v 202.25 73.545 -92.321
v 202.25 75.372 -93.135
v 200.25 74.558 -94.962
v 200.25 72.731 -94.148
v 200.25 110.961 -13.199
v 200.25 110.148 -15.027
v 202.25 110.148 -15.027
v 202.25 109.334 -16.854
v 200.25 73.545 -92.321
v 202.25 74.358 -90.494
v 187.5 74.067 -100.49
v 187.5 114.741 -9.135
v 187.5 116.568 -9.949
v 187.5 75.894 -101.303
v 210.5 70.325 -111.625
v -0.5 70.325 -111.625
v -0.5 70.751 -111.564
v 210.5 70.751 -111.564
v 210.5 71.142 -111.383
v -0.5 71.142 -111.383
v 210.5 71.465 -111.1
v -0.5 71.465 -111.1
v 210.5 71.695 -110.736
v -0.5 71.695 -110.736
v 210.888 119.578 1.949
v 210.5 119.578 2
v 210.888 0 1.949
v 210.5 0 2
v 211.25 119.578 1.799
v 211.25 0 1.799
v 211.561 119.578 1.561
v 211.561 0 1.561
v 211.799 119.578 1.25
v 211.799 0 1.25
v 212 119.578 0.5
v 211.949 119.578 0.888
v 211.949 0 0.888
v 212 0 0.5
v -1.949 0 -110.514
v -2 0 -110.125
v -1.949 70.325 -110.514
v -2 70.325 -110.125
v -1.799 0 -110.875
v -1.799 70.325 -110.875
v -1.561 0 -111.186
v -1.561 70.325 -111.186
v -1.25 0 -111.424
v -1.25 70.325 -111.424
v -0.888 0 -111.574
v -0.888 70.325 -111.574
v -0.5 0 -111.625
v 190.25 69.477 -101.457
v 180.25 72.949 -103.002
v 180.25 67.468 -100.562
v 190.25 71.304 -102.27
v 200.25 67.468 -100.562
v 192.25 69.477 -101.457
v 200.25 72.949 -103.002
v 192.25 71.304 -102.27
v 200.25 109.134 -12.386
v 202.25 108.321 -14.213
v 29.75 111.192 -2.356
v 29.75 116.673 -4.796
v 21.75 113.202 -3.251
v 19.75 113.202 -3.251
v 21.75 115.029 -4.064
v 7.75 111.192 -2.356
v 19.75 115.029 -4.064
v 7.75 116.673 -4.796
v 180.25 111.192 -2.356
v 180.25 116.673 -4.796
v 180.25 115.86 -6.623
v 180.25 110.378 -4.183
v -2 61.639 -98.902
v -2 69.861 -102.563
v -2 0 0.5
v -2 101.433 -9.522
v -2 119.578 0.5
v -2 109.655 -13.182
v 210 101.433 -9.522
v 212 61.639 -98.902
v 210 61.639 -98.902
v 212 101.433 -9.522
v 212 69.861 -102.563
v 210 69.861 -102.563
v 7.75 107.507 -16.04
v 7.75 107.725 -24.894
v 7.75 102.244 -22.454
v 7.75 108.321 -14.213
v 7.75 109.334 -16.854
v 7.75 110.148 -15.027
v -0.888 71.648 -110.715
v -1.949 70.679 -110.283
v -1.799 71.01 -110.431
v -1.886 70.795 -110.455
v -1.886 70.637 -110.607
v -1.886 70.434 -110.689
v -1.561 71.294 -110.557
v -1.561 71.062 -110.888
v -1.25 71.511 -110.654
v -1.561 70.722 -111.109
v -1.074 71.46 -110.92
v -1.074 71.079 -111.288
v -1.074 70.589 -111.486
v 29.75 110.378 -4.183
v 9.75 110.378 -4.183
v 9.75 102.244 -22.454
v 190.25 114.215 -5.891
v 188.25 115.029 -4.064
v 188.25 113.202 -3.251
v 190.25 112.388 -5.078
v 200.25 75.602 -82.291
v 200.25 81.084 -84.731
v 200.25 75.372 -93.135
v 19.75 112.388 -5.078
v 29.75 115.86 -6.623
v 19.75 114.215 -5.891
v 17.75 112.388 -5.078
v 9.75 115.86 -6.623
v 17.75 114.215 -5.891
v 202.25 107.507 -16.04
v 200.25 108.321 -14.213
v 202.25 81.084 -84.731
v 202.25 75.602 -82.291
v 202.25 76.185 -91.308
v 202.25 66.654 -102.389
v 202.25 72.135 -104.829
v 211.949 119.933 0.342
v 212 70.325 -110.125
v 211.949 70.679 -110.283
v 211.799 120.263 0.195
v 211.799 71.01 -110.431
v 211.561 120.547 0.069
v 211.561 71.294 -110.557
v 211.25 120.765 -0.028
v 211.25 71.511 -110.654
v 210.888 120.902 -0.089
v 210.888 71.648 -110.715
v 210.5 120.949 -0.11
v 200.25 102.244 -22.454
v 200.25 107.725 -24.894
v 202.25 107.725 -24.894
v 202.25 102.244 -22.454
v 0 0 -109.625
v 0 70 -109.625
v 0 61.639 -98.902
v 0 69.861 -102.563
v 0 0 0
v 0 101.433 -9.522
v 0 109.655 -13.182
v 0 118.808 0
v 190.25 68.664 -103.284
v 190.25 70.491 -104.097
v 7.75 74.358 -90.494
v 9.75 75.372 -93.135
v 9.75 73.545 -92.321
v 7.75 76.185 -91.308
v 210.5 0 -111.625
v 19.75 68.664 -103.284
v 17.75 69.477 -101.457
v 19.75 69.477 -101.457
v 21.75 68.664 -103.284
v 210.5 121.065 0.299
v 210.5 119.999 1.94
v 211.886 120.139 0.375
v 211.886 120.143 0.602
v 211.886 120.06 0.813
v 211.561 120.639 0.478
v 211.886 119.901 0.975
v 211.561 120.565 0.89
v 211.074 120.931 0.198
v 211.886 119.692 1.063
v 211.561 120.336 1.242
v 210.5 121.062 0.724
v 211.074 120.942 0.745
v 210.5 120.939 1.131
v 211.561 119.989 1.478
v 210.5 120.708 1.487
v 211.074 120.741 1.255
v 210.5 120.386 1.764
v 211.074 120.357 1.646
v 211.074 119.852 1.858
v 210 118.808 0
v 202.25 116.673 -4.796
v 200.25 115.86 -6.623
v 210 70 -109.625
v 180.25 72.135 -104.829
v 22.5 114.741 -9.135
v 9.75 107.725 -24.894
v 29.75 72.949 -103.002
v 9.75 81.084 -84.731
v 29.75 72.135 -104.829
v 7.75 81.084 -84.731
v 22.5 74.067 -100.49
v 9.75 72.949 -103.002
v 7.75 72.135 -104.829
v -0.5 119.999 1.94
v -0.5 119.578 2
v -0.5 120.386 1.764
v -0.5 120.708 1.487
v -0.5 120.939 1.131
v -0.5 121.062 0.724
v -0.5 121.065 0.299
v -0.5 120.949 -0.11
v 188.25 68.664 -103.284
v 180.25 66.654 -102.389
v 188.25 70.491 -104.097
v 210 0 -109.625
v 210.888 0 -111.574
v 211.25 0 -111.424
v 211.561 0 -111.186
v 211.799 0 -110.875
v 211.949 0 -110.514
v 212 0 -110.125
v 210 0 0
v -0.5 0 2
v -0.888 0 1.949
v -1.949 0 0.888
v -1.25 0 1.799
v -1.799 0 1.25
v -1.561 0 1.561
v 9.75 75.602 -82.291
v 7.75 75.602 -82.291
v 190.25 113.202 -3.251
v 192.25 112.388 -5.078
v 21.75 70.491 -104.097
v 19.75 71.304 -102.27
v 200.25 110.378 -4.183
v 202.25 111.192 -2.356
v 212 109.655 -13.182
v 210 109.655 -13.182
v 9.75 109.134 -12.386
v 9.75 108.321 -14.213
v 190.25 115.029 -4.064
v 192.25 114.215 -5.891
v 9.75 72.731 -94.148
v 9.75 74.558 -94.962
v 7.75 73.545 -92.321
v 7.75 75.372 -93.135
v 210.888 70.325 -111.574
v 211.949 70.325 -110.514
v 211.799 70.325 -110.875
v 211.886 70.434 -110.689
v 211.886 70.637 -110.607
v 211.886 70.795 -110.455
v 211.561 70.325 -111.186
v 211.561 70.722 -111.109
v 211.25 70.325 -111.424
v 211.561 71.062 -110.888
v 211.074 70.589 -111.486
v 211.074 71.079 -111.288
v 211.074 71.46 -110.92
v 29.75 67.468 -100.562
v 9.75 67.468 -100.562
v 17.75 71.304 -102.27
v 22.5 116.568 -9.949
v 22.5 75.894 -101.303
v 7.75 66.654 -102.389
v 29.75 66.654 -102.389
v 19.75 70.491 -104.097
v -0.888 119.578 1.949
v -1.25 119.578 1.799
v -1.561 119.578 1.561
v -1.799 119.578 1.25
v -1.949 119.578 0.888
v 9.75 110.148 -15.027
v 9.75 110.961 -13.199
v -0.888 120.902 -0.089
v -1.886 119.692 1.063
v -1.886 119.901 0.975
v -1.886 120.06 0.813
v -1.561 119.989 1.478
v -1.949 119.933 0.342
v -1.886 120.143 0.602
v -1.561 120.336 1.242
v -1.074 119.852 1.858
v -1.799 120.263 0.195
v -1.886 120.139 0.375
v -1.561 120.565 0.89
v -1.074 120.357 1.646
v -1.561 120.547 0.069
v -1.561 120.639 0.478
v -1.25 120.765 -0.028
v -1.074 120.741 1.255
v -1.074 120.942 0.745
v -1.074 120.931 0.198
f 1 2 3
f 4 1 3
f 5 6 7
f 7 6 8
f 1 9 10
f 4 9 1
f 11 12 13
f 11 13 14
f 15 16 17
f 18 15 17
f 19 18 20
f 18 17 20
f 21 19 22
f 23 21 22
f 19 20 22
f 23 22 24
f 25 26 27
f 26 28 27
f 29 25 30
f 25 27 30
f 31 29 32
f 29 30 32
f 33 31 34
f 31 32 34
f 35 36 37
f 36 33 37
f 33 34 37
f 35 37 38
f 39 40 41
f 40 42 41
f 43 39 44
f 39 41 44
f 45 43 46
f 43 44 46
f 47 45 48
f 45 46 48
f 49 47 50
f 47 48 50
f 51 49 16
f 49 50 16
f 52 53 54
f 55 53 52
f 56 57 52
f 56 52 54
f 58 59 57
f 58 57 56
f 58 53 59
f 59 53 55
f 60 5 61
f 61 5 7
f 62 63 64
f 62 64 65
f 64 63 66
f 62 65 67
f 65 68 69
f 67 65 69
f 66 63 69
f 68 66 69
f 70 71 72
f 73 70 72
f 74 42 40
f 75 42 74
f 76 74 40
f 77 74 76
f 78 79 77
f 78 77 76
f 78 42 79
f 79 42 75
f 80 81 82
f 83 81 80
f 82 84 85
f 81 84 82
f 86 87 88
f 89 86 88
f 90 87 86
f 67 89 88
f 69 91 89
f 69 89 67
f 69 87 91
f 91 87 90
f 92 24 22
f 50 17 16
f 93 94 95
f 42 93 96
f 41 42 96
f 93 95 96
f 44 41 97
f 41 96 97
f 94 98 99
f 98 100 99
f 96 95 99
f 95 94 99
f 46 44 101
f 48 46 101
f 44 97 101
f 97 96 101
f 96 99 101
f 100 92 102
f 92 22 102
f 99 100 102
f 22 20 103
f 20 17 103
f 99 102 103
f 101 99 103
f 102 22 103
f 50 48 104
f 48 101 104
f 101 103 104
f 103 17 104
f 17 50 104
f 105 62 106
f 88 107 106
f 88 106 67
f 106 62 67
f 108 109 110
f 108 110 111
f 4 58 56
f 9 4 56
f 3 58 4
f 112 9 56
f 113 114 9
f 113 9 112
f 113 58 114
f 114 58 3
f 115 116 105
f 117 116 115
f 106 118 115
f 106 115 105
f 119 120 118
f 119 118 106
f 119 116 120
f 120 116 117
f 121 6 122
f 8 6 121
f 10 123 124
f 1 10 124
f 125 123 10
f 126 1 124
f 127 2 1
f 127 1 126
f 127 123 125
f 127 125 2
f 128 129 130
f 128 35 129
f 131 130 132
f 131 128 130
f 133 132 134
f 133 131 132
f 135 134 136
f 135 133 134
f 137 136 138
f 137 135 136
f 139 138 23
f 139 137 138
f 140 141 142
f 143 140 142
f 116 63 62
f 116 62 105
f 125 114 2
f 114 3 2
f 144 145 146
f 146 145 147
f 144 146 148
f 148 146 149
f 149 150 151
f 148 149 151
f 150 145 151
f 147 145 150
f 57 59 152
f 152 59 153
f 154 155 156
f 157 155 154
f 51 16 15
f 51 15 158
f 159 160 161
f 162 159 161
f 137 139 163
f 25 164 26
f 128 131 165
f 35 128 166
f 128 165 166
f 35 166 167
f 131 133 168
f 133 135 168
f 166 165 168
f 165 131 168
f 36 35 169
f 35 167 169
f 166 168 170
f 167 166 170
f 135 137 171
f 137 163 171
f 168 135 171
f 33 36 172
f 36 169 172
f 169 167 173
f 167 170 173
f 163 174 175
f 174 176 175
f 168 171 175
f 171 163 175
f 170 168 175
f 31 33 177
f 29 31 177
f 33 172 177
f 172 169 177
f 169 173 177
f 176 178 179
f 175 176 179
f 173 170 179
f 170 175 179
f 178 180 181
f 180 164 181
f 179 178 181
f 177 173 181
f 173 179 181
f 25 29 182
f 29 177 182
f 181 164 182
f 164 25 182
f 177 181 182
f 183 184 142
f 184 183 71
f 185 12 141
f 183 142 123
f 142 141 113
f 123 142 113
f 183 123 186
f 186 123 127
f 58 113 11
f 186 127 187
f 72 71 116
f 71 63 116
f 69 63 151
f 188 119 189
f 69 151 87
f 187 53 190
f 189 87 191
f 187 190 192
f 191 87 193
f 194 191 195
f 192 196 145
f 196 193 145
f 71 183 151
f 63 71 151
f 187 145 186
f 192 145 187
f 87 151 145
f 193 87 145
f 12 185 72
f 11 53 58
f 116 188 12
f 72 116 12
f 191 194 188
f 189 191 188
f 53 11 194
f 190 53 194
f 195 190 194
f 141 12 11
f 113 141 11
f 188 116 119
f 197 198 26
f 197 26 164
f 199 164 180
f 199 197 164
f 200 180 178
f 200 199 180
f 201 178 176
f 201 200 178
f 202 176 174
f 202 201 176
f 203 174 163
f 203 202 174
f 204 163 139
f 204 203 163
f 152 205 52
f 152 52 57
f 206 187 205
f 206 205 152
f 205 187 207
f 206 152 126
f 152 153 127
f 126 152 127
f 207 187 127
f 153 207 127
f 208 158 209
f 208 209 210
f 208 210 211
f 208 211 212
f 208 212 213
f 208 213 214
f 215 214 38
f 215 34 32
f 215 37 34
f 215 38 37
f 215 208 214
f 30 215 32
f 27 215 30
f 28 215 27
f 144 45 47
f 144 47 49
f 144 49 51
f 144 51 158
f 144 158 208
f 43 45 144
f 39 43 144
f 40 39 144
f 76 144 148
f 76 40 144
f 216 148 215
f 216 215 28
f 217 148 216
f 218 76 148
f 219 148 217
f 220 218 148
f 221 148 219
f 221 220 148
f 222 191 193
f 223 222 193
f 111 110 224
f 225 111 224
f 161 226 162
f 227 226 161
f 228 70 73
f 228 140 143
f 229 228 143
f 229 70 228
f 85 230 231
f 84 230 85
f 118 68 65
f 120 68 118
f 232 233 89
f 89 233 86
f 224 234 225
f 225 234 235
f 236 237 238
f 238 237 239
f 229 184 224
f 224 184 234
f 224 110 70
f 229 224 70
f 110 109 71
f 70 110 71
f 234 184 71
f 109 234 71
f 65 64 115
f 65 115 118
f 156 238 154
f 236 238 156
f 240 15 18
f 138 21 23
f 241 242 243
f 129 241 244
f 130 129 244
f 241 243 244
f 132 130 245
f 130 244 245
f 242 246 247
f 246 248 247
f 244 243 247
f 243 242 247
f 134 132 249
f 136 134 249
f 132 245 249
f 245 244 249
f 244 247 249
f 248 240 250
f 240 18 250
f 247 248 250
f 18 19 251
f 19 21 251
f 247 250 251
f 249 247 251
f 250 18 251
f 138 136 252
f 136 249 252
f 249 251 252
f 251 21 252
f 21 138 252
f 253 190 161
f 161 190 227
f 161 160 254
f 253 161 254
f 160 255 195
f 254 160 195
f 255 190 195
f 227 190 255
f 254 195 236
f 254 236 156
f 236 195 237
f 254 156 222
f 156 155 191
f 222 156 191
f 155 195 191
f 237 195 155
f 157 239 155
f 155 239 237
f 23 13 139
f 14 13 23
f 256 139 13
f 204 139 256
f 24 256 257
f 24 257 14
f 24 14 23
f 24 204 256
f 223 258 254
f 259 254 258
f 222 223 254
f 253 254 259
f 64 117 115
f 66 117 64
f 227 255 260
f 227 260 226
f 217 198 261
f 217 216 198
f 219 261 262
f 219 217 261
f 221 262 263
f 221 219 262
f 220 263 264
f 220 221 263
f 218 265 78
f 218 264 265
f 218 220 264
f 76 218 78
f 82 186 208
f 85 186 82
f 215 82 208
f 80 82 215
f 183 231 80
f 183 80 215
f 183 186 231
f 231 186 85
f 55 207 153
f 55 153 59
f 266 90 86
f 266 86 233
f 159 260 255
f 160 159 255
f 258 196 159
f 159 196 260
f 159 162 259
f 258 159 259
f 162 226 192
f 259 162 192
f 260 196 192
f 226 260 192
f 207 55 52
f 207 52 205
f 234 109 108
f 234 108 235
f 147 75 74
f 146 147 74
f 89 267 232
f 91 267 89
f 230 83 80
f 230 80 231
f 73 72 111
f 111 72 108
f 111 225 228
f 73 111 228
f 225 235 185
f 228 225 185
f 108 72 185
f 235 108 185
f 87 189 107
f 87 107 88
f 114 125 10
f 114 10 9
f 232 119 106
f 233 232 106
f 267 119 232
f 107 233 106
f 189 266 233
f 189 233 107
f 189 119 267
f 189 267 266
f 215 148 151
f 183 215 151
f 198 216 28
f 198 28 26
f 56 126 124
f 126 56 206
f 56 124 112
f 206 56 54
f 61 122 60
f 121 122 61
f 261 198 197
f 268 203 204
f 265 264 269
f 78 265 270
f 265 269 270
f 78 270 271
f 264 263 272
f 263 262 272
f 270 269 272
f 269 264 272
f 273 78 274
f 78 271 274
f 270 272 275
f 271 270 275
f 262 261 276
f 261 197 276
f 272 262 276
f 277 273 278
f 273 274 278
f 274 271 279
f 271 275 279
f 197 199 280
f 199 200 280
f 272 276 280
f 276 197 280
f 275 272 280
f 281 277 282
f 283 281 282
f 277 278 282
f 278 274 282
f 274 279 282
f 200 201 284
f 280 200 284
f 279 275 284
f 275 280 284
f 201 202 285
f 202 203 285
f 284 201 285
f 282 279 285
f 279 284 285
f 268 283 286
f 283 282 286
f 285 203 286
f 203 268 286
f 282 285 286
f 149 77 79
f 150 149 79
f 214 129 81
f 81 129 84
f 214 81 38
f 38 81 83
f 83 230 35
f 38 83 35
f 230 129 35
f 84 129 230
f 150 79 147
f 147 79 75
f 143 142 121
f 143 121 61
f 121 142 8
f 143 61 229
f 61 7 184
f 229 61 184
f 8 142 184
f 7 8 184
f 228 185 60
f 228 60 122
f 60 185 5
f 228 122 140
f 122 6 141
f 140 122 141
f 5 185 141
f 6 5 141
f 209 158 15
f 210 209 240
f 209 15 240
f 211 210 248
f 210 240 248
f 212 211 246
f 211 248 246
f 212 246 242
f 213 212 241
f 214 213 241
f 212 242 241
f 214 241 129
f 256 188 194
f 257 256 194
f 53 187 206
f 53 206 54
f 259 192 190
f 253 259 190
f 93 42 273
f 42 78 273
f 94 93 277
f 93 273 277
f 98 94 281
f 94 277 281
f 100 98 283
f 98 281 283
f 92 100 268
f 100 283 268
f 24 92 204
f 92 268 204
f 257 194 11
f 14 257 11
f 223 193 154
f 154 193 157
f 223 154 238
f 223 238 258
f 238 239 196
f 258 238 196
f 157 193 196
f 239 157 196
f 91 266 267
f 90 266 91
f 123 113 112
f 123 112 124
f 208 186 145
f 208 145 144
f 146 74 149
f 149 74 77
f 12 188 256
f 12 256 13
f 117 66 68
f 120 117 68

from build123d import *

# Parameters (mm, degrees)
EXTRUDE_1_DEPTH     = 210
SHELL_1_T           = 2
SKETCH_3_W          = 165
SKETCH_3_H          = 100
CUT_EXTRUDE_2_DEPTH = 2
EXTRUDE_2_DEPTH     = 6
CUT_EXTRUDE_3_DEPTH = 2
CUT_EXTRUDE_4_DEPTH = 2
CUT_EXTRUDE_5_DEPTH = 2
FILLET_1_R          = 1.5


with BuildPart() as part:
    # 草图2 → 凸台-拉伸1 (new body)
    with BuildSketch(Plane(origin=(0, 0, 0), x_dir=(0, 0, -1), z_dir=(1, 0, 0))):
        Polygon((0, 0), (0, 118.808397169), (109.625454917, 70), (109.625454917, 0), align=None)
    extrude(amount=EXTRUDE_1_DEPTH)

    # 抽壳1
    shell_1_openings = [part.faces().sort_by_distance(p)[0] for p in [
        (105, 0, -54.812727459),
    ]]
    offset(amount=SHELL_1_T, openings=shell_1_openings, kind=Kind.INTERSECTION)

    # 草图3 → 切除-拉伸2 (cut)
    with BuildSketch(Plane(origin=(0, 99.153366004, -44.14592279), x_dir=(1, 0, 0), z_dir=(0, 0.9135454576426035, -0.4067366430757946))):
        with Locations((105, 11.676271366)):
            Rectangle(SKETCH_3_W, SKETCH_3_H)
    extrude(amount=CUT_EXTRUDE_2_DEPTH, mode=Mode.SUBTRACT)

    # 草图5 → 凸台-拉伸2 (add)
    with BuildSketch(Plane(origin=(0, 99.153366004, -44.14592279), x_dir=(1, 0, 0), z_dir=(0, -0.9135454576426034, 0.4067366430757947))):
        Polygon((9.75, 43.073728634), (29.75, 43.073728634), (29.75, 41.073728634), (9.75, 41.073728634), (9.75, 21.073728634), (7.75, 21.073728634), (7.75, 43.073728634), align=None)
        Polygon((180.25, 43.073728634), (180.25, 41.073728634), (200.25, 41.073728634), (200.25, 21.073728634), (202.25, 21.073728634), (202.25, 43.073728634), (200.25, 43.073728634), align=None)
        Polygon((180.25, -66.426271366), (180.25, -64.426271366), (200.25, -64.426271366), (200.25, -44.426271366), (202.25, -44.426271366), (202.25, -66.426271366), (200.25, -66.426271366), align=None)
        Polygon((29.75, -66.426271366), (29.75, -64.426271366), (9.75, -64.426271366), (9.75, -44.426271366), (7.75, -44.426271366), (7.75, -66.426271366), (9.75, -66.426271366), align=None)
    extrude(amount=EXTRUDE_2_DEPTH)

    # 草图8 → 切除-拉伸3 (cut)
    with BuildSketch(Plane(origin=(0, 97.50898418, -43.413796832), x_dir=(-1, 0, 0), z_dir=(0, -0.9135454576426034, 0.4067366430757947))):
        Polygon((-19.75, -41.073728634), (-21.75, -43.073728634), (-19.75, -43.073728634), (-7.75, -31.073728634), (-7.75, -29.073728634), (-9.75, -31.073728634), align=None)
        Polygon((-19.75, 64.426271366), (-21.75, 66.426271366), (-19.75, 66.426271366), (-7.75, 54.426271366), (-7.75, 52.426271366), (-9.75, 54.426271366), align=None)
        Polygon((-190.25, -41.073728634), (-188.25, -43.073728634), (-190.25, -43.073728634), (-202.25, -31.073728634), (-202.25, -29.073728634), (-200.25, -31.073728634), align=None)
        Polygon((-200.25, 54.426271366), (-202.25, 52.426271366), (-202.25, 54.426271366), (-190.25, 66.426271366), (-188.25, 66.426271366), (-190.25, 64.426271366), align=None)
    extrude(amount=CUT_EXTRUDE_3_DEPTH, mode=Mode.SUBTRACT)

    # 草图10 → 切除-拉伸4 (cut)
    with BuildSketch(Plane.ZY.offset(2)):
        Polygon((-98.902140019, 61.638692052), (-9.521804093, 101.433381509), (-13.182433881, 109.655290628), (-102.562769807, 69.860601171), align=None)
    extrude(amount=-CUT_EXTRUDE_4_DEPTH, mode=Mode.SUBTRACT)

    # 草图11 → 切除-拉伸5 (cut)
    with BuildSketch(Plane(origin=(212, 0, 0), x_dir=(0, 0, -1), z_dir=(1, 0, 0))):
        Polygon((9.521804093, 101.433381509), (13.182433881, 109.655290628), (102.562769807, 69.860601171), (98.902140019, 61.638692052), align=None)
    extrude(amount=-CUT_EXTRUDE_5_DEPTH, mode=Mode.SUBTRACT)

    # 圆角1
    fillet_1_edges = [part.edges().sort_by_distance(p)[0] for p in [
        (212, 96.593471142, -54.812727459),
        (212, 60.944063548, 2),
        (-2, 60.944063548, 2),
        (-2, 96.593471142, -54.812727459),
        (-2, 35.649407593, -111.625454917),
        (105, 121.888127097, 2),
        (105, 71.298815186, -111.625454917),
        (212, 35.649407593, -111.625454917),
    ]]
    fillet(fillet_1_edges, radius=FILLET_1_R)


solid = part.part
